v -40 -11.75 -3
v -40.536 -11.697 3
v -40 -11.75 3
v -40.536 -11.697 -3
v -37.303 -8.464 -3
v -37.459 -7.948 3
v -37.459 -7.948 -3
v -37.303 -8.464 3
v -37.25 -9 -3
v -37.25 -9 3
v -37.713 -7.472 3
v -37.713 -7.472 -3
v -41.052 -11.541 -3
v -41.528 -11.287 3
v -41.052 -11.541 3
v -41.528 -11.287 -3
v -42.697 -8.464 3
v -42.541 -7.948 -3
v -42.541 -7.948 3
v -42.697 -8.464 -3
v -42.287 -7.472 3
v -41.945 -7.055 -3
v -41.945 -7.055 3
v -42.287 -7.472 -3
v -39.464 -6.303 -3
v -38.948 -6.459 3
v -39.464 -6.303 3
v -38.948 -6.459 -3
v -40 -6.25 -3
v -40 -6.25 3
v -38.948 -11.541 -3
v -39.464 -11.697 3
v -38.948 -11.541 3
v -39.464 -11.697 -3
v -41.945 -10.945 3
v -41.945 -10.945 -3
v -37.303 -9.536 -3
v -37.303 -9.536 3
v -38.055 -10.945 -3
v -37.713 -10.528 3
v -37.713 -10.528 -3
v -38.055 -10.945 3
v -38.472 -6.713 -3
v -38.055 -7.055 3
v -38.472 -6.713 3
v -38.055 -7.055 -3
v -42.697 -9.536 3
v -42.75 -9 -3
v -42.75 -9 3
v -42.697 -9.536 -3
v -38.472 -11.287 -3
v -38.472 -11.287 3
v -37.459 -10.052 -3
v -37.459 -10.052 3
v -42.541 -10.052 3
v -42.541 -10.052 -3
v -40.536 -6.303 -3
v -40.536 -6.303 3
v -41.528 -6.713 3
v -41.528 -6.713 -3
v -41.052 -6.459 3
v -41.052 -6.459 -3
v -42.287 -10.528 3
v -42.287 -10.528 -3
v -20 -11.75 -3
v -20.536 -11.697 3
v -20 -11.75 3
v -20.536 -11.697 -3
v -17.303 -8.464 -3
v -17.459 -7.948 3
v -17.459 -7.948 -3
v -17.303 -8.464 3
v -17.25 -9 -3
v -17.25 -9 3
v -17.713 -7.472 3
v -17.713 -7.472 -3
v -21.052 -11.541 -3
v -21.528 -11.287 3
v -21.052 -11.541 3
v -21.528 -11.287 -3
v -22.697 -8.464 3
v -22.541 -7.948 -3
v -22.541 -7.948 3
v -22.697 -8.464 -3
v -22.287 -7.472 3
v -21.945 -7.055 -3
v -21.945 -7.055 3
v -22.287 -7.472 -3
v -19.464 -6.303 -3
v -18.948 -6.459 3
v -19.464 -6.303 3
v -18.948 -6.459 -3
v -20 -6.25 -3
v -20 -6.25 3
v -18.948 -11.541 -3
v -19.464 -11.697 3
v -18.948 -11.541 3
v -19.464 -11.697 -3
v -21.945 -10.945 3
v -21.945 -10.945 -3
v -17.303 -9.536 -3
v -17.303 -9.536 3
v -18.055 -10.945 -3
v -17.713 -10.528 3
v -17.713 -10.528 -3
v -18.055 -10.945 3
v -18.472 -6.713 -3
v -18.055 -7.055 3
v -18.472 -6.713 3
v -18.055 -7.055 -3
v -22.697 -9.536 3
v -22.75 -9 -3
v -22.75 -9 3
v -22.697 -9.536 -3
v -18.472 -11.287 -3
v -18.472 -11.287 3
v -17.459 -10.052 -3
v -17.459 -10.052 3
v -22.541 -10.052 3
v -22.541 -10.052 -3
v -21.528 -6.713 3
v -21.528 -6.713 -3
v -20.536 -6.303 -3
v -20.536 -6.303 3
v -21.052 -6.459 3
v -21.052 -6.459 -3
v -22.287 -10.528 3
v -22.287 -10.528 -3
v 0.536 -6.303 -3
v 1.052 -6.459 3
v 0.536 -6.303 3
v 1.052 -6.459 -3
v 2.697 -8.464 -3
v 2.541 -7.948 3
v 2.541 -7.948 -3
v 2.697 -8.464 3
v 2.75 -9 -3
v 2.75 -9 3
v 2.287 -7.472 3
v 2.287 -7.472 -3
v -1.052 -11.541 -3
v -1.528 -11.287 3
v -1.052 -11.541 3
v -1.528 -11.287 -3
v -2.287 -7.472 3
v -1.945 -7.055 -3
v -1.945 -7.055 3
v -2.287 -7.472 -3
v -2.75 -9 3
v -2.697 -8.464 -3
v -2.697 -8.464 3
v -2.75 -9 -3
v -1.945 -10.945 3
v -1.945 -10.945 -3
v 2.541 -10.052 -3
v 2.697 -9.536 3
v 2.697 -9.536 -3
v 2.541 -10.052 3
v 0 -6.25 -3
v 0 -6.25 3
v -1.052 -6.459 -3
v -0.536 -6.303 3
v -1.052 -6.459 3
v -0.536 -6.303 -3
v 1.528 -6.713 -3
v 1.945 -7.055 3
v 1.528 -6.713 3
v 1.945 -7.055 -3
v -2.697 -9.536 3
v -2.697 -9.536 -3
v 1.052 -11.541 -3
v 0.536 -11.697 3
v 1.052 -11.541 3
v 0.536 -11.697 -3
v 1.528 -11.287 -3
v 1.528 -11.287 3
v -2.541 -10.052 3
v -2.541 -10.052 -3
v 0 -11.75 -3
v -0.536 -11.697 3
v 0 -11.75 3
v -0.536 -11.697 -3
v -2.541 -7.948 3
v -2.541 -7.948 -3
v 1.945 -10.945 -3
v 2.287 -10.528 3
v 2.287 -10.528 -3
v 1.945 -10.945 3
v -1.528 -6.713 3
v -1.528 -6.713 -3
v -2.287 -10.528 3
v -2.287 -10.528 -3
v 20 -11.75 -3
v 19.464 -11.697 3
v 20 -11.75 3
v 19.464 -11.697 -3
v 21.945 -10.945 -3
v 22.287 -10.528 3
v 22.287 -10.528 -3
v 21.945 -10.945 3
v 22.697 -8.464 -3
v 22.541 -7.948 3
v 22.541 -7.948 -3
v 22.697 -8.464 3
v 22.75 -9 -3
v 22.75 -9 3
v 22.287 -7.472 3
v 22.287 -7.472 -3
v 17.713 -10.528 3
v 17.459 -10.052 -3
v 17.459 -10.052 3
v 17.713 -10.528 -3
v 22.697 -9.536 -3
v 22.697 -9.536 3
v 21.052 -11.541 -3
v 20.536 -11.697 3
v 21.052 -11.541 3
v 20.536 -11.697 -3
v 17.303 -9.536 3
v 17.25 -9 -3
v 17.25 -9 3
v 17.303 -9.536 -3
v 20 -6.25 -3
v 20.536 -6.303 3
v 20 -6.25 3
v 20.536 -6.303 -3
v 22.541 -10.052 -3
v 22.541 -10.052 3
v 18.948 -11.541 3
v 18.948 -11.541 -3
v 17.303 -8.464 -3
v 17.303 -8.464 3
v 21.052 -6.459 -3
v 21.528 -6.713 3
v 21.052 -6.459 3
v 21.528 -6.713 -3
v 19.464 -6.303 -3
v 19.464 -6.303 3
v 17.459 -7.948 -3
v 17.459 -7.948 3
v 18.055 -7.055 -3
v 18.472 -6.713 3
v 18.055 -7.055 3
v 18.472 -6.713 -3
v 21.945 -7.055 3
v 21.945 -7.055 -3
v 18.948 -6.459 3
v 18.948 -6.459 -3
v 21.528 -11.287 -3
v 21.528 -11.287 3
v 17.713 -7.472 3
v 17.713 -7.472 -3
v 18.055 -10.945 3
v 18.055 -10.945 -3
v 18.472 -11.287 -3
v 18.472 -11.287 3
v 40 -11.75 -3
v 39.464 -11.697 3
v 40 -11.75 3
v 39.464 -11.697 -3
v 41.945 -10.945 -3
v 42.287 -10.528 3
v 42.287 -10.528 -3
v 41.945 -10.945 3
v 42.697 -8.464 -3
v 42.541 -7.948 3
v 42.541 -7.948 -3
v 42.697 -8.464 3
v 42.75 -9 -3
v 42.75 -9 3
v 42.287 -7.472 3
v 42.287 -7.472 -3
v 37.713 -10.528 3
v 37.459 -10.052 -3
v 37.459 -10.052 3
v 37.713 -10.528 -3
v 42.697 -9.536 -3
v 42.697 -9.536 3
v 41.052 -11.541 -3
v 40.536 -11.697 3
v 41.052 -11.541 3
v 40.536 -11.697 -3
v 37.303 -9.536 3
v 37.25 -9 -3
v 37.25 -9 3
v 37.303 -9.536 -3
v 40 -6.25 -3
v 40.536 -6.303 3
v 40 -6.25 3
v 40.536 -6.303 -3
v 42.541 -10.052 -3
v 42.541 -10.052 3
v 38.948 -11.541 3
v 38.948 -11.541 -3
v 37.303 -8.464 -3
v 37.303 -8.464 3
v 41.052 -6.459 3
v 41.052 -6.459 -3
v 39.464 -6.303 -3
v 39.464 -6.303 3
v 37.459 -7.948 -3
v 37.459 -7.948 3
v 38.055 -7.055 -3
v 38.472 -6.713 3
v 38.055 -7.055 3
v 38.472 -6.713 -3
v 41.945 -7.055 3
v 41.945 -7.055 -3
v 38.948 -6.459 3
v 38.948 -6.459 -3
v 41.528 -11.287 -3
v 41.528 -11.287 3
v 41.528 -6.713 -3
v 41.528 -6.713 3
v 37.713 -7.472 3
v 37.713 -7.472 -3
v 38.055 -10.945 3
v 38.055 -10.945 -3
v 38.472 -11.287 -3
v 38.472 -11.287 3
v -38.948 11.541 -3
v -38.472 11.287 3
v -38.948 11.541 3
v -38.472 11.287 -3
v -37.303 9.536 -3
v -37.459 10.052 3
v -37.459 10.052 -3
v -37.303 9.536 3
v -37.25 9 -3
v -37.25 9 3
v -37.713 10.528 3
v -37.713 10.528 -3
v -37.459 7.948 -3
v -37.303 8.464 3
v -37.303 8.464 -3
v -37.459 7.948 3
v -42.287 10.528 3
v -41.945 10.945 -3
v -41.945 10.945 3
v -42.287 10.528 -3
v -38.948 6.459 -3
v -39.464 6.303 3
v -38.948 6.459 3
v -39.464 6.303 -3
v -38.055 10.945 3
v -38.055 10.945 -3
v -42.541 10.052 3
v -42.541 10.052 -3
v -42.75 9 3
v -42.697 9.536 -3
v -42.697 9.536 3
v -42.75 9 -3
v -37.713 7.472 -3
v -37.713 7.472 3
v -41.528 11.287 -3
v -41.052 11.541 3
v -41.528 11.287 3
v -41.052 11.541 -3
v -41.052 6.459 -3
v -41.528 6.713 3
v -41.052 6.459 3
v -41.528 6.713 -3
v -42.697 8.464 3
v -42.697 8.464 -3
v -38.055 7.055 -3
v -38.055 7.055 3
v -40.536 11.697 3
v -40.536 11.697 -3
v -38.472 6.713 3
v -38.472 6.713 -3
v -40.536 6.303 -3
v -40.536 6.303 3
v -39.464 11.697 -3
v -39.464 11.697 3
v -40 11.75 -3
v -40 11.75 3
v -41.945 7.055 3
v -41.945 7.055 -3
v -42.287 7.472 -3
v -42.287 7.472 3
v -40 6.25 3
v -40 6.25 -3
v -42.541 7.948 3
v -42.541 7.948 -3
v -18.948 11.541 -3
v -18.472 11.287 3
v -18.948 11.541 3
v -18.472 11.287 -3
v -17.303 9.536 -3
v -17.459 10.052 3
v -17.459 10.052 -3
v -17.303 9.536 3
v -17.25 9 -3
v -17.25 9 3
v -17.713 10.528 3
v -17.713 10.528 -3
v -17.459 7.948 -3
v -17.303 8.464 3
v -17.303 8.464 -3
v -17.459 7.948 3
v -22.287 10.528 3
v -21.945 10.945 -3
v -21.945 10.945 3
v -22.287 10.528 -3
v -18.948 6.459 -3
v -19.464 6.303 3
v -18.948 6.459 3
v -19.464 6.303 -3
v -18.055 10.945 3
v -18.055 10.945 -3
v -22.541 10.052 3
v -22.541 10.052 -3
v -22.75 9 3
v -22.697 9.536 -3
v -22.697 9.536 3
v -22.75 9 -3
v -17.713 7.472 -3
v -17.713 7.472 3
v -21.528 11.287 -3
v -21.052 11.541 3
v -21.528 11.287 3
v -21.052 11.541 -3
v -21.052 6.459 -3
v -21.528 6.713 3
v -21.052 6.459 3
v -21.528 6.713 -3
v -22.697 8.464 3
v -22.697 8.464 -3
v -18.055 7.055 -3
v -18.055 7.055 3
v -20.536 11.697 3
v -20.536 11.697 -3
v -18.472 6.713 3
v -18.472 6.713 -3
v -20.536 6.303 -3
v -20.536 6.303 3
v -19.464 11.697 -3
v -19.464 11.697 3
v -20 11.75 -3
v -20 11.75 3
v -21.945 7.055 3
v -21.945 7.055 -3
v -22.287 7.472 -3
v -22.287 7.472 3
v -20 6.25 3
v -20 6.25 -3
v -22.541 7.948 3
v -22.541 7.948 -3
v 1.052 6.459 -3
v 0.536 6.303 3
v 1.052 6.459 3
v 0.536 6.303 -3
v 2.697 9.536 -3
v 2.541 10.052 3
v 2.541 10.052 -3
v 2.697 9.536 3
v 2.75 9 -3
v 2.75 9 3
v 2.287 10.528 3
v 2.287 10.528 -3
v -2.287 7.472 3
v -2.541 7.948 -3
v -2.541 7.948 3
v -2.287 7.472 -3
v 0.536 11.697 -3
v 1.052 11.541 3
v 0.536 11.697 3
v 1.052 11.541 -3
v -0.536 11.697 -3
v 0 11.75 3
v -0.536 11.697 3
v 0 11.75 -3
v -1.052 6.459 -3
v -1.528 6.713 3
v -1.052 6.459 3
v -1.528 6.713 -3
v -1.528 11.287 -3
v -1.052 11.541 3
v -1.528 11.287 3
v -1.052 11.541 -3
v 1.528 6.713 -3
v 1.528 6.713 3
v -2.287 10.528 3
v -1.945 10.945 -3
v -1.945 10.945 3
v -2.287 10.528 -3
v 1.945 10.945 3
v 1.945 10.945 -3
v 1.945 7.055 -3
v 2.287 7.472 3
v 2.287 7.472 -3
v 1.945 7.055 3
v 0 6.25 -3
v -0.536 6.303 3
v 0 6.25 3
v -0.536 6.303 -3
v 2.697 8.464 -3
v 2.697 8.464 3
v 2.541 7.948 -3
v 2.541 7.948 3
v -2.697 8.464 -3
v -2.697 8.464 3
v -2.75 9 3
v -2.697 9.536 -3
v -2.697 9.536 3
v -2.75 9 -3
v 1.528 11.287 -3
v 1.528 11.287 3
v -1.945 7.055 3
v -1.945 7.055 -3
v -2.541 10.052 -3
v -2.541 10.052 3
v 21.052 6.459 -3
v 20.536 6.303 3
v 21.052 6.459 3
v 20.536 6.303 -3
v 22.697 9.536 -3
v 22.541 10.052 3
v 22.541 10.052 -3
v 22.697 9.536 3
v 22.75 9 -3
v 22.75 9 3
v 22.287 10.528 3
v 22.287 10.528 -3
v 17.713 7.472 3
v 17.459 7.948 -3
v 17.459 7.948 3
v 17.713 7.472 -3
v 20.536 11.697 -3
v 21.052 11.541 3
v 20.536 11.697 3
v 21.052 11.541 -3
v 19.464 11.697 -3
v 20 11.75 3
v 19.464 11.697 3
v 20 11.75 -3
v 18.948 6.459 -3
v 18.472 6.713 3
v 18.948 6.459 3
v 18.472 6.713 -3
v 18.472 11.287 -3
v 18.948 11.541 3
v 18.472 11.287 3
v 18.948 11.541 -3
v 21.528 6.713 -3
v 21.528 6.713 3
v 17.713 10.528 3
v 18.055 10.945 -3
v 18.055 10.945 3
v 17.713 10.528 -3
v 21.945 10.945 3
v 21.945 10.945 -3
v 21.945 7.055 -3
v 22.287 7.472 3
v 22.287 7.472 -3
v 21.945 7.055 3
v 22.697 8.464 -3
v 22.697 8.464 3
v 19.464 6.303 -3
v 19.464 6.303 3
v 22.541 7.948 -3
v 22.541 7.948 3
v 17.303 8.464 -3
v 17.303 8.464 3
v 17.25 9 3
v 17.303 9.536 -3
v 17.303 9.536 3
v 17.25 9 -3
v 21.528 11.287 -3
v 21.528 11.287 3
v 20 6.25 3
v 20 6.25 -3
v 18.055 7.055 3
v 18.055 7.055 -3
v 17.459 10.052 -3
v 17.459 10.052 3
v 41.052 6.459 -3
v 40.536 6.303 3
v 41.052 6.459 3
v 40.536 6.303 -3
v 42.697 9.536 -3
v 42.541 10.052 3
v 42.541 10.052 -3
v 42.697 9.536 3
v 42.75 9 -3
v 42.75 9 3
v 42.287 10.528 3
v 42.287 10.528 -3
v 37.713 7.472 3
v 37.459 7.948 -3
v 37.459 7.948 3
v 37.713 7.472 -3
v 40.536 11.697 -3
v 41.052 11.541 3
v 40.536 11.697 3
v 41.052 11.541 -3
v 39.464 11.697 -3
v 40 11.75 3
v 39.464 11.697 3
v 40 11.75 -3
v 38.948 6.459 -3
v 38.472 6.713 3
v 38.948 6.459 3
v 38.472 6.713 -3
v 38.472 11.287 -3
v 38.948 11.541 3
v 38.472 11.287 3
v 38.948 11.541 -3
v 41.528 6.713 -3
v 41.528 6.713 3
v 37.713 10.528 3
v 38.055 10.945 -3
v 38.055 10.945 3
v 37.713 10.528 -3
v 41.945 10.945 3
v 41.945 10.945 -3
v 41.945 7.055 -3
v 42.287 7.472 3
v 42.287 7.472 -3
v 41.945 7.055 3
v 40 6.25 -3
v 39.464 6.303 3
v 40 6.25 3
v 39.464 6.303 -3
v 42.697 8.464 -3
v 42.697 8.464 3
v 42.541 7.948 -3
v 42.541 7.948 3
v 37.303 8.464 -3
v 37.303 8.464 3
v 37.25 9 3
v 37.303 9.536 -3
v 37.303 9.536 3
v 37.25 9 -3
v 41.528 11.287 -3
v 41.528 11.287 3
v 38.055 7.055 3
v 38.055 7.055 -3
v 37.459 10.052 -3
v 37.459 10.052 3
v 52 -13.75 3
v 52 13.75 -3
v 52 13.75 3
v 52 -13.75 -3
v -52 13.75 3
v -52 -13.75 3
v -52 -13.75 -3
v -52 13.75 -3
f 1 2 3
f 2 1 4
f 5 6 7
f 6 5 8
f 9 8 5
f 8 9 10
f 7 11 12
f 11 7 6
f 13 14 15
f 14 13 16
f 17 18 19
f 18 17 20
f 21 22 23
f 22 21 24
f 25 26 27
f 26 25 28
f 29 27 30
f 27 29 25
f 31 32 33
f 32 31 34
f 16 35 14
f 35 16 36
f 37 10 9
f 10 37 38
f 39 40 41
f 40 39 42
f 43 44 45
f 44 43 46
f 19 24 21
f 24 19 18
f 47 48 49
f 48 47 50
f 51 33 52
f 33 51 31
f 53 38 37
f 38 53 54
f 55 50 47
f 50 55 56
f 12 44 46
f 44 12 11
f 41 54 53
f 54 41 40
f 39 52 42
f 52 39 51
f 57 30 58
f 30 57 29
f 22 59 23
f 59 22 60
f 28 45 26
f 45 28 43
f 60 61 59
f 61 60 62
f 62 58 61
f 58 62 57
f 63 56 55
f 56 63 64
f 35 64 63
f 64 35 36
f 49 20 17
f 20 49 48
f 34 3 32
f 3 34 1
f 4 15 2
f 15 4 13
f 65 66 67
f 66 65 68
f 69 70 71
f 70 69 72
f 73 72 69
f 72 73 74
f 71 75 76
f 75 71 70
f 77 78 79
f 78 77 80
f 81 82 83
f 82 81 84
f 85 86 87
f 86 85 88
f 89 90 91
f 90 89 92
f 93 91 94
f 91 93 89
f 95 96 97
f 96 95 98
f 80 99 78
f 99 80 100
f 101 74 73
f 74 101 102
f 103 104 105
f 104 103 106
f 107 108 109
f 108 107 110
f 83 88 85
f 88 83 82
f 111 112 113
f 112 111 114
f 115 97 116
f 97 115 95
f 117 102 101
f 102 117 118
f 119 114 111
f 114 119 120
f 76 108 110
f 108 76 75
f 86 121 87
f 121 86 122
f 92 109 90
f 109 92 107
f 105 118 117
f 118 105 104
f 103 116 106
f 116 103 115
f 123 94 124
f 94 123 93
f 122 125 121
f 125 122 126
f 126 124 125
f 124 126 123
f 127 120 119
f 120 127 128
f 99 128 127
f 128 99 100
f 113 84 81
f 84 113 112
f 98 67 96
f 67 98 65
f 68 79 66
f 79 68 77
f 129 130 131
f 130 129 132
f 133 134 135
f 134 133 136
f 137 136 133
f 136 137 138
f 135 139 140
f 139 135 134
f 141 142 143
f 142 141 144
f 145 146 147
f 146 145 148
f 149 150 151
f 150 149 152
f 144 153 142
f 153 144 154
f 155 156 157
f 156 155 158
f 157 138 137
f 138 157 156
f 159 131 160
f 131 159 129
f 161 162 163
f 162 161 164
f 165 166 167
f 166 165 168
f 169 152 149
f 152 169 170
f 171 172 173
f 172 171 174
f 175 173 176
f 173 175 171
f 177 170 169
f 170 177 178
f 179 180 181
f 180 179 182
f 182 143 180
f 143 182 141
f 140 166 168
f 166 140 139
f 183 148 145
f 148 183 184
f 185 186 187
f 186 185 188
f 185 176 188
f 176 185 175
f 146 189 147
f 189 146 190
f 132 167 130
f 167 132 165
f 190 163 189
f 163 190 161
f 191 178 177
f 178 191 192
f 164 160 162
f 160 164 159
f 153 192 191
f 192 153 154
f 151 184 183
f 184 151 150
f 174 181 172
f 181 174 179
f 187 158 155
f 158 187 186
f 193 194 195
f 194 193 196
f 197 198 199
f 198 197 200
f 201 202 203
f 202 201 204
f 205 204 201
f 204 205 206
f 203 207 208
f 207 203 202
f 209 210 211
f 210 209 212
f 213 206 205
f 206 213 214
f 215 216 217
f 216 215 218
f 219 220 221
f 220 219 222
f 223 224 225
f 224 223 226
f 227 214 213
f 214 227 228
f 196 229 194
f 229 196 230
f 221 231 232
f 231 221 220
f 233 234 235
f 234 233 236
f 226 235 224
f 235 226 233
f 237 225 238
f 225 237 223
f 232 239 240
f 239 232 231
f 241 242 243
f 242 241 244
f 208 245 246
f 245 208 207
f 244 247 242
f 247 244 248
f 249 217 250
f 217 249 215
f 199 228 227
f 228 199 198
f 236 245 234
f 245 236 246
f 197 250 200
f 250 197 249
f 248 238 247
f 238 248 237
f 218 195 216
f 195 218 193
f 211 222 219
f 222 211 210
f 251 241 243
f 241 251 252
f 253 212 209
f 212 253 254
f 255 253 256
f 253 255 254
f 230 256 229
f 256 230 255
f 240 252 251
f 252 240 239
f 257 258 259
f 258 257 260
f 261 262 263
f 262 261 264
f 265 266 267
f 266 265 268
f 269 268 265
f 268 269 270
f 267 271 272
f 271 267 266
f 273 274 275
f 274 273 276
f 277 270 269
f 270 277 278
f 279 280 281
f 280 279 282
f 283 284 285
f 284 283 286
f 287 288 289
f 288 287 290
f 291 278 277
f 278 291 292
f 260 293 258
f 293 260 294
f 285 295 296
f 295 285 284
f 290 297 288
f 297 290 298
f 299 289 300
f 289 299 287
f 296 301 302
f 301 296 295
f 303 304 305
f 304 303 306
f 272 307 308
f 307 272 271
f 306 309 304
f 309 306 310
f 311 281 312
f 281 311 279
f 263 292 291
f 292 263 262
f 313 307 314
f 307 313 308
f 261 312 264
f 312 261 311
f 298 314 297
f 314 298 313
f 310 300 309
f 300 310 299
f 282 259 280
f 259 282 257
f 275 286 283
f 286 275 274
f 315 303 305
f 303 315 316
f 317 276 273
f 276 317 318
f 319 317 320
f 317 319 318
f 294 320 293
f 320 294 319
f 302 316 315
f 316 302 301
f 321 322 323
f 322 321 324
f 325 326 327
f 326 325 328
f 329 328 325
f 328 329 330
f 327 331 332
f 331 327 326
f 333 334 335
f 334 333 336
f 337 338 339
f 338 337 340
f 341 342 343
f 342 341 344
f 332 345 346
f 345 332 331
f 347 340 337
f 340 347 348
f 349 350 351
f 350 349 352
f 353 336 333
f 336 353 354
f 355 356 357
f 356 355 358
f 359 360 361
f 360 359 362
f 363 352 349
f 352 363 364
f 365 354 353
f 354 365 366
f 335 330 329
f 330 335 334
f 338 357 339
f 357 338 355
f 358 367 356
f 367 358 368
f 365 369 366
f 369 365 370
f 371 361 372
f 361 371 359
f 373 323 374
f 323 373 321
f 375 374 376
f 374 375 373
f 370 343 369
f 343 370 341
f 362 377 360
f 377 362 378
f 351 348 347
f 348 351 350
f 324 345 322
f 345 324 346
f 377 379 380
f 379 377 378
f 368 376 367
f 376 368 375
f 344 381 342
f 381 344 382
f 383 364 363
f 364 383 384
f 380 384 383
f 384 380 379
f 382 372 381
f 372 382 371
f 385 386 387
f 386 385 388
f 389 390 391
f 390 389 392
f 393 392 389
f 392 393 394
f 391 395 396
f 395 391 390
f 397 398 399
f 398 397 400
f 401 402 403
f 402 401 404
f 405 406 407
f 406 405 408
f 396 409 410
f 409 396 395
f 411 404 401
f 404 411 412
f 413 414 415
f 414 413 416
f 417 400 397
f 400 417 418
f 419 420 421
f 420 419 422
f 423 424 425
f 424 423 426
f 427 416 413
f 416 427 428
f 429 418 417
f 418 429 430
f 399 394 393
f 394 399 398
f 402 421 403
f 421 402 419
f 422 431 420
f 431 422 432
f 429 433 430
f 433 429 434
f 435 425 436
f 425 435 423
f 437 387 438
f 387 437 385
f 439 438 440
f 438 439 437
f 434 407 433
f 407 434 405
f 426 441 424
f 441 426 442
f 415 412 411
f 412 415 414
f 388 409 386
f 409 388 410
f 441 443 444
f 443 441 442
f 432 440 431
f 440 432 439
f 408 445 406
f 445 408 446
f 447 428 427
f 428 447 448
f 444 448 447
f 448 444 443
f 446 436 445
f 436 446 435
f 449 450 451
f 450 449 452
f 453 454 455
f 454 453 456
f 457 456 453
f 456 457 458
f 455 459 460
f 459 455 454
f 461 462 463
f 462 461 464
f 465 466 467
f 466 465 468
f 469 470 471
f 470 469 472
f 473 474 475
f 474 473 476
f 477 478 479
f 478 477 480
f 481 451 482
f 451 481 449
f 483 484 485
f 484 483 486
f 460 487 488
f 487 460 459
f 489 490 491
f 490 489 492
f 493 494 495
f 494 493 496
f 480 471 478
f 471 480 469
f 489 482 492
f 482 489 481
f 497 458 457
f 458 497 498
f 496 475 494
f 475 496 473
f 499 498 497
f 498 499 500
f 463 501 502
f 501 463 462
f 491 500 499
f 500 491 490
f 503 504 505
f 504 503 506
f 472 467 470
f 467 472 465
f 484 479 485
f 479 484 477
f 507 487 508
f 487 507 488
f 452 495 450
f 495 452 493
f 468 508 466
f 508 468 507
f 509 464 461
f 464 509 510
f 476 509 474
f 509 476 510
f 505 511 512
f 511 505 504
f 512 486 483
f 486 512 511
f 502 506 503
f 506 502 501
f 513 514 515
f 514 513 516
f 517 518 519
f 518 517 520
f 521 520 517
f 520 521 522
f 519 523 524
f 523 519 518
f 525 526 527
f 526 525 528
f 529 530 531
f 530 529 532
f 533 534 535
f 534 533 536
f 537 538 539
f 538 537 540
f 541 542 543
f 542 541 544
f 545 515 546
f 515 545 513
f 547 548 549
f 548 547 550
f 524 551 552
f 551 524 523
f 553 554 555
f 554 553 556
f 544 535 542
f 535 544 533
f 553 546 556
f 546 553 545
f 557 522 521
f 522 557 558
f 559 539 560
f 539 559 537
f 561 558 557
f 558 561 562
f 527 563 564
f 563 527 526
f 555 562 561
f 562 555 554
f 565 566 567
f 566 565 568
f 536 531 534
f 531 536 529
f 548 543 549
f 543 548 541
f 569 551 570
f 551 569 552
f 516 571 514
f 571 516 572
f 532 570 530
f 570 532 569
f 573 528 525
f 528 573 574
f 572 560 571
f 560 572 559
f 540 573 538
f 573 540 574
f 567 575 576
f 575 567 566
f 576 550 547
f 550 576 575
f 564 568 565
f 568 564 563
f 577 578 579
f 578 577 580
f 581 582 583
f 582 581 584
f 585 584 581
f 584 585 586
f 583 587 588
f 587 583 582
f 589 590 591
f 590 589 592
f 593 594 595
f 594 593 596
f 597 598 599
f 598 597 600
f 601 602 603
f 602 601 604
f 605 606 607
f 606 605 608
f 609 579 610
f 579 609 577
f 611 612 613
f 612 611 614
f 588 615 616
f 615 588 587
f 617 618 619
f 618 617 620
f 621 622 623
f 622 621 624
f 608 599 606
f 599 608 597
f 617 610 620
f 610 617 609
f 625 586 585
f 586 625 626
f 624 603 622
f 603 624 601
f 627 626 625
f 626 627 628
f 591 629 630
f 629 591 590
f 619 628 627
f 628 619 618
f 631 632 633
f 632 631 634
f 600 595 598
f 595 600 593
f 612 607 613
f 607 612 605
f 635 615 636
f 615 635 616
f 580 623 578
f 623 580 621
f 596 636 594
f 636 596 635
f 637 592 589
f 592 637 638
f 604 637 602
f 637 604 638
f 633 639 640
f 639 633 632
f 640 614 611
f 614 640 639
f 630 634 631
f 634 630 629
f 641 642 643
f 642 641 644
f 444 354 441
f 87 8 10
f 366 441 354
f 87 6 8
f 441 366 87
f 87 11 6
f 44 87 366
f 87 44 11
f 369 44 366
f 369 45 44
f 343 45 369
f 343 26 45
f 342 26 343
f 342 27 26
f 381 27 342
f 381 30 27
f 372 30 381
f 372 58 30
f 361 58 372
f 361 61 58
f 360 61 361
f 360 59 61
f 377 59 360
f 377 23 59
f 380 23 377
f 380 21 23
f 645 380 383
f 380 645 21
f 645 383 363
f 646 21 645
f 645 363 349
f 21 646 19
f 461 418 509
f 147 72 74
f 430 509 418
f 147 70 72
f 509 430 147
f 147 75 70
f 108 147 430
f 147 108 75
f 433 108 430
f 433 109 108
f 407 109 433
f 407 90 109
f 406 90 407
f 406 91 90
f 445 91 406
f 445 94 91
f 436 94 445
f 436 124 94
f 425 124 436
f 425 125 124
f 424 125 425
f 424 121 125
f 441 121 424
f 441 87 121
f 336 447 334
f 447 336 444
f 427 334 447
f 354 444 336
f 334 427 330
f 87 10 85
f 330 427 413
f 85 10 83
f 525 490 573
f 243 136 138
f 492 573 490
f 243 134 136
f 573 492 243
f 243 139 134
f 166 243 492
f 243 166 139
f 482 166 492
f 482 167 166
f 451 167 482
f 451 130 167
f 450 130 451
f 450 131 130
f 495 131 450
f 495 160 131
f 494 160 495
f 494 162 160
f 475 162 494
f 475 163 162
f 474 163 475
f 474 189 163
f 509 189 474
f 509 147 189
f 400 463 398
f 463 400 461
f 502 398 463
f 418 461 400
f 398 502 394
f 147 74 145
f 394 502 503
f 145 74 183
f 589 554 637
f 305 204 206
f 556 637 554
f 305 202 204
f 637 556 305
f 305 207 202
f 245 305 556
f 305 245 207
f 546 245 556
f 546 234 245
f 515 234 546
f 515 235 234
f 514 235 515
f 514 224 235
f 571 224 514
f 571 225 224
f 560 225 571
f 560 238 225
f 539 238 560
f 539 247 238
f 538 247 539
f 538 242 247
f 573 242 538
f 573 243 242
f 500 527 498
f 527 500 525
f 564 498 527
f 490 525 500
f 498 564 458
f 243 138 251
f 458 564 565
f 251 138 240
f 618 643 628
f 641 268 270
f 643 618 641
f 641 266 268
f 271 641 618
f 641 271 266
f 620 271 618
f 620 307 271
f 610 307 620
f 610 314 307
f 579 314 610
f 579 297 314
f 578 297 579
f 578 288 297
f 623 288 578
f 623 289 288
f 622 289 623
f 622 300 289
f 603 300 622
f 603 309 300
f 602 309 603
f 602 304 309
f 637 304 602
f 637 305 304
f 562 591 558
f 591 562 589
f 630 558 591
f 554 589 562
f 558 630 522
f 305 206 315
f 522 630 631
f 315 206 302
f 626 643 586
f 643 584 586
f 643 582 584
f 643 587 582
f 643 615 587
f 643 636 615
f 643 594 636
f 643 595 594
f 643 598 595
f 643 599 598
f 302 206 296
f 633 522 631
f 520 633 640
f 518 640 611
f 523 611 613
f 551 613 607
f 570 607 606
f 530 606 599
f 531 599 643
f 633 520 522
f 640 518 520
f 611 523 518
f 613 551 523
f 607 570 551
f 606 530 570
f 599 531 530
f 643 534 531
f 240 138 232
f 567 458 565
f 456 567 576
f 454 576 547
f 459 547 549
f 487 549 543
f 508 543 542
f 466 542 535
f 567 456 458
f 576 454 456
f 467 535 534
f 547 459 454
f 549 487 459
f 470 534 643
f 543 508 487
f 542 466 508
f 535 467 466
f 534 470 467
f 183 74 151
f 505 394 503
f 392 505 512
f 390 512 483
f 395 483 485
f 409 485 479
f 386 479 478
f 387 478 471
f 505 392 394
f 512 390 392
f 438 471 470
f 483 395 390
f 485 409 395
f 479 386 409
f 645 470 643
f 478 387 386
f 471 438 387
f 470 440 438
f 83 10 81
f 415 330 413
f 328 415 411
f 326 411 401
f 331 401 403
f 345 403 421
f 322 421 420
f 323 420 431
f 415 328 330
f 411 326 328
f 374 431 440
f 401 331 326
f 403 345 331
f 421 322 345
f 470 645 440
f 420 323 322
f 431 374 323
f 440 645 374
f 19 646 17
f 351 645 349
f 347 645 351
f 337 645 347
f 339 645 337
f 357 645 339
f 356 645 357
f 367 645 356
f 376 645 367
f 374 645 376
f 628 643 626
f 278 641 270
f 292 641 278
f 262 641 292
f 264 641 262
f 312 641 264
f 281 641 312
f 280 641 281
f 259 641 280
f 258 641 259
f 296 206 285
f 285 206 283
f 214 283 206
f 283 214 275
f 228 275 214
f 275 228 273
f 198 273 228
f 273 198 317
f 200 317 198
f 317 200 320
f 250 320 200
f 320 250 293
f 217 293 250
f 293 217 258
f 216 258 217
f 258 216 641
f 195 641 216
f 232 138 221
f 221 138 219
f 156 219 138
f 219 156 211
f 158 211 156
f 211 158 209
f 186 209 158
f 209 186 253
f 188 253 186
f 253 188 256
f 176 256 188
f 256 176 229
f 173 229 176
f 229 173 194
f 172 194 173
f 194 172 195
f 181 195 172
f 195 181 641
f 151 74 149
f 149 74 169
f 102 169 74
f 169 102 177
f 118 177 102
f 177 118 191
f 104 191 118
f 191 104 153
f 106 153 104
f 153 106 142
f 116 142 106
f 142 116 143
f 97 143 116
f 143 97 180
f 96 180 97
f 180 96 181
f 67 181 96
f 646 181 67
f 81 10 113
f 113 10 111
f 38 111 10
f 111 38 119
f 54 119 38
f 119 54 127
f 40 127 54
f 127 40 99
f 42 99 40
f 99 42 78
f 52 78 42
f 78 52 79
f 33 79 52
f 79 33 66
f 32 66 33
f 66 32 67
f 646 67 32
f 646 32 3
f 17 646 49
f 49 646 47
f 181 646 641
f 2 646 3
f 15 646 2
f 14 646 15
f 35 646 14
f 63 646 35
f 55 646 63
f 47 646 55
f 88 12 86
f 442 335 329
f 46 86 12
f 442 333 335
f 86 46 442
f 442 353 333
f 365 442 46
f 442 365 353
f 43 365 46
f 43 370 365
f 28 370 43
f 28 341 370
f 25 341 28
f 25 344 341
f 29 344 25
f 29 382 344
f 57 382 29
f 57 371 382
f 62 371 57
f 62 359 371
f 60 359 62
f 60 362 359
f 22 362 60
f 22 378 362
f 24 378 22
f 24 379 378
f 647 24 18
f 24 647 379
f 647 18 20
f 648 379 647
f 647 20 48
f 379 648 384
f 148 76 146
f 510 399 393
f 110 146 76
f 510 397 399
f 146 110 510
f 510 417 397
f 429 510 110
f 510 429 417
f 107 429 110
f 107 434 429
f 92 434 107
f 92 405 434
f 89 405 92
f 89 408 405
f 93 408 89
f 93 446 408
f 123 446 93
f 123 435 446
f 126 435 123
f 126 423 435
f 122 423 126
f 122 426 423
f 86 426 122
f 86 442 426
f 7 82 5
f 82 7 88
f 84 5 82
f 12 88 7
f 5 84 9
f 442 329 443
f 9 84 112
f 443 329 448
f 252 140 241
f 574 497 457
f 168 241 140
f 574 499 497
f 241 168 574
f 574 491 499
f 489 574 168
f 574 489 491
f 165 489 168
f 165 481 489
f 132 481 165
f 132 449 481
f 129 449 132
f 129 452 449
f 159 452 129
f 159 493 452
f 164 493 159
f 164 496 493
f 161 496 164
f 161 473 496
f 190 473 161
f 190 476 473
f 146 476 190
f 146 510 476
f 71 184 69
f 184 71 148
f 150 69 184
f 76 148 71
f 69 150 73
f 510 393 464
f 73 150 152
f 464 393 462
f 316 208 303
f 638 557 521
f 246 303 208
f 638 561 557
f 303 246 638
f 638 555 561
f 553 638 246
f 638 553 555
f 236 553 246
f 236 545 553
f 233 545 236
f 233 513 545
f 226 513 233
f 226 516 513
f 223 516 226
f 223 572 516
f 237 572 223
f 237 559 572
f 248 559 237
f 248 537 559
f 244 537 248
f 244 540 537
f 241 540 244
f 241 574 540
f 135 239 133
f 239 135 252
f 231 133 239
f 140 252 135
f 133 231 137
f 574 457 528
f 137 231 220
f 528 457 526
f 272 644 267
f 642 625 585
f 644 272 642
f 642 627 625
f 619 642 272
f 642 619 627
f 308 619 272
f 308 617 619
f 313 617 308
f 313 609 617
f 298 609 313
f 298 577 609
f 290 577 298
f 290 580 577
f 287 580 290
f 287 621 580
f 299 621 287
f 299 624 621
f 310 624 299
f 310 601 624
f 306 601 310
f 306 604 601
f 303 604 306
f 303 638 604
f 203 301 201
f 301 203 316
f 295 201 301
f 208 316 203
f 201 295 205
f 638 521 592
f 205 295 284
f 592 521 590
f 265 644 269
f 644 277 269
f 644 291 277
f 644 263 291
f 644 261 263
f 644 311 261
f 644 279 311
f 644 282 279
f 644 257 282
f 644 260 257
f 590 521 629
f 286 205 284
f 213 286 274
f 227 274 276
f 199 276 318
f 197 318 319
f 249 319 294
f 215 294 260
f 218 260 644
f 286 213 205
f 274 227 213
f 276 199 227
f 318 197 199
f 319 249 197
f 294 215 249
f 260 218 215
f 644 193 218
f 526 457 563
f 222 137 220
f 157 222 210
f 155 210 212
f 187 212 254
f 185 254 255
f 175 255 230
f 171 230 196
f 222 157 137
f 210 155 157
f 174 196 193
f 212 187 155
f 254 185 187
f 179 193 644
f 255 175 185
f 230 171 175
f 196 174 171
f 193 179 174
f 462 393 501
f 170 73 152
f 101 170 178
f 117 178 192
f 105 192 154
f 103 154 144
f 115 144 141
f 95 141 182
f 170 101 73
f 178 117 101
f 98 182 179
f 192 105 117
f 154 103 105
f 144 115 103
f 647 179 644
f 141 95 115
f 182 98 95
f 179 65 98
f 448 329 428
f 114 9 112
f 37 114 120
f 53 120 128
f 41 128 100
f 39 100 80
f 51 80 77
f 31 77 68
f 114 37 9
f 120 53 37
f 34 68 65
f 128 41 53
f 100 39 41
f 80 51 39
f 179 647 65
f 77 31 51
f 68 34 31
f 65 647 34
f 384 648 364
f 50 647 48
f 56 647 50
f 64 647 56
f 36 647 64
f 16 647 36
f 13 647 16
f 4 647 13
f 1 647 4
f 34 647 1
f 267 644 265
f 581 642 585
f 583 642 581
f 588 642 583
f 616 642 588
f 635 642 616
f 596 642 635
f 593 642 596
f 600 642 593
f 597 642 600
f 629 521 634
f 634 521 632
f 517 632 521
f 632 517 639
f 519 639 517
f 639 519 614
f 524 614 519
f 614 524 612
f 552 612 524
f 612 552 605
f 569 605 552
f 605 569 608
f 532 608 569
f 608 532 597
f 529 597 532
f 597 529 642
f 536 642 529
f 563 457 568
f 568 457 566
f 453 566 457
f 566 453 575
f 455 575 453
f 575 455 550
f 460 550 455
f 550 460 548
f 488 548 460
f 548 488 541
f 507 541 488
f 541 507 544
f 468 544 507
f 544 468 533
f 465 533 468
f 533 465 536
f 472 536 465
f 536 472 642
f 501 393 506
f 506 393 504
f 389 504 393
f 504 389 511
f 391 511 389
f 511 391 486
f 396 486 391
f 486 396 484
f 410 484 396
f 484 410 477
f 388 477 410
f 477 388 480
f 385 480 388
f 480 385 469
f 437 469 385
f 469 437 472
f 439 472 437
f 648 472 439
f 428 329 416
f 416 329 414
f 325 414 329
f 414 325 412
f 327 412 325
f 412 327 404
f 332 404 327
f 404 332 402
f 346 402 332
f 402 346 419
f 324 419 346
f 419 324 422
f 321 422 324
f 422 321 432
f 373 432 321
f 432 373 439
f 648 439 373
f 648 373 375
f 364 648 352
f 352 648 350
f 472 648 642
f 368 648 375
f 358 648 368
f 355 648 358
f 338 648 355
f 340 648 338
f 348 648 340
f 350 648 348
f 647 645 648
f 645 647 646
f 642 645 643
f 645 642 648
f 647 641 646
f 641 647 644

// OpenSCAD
$fn = 32;

// ----------------------------------------------------------------------
// Hole bar, 5 x Ø5.5
// tworows layout, 12 mm edge offset
// ----------------------------------------------------------------------

// --- parameters (mm) ---
bar_w = 27.5;     // bar width (Y)
bar_t = 6;        // bar thickness (Z)
holes = 5;        // holes per row
hole_d = 5.5;     // hole diameter
edge = 12;        // offset from the bar end to the first hole
pitch = 20;       // pitch between neighbouring holes
row_offset = 18;  // distance between the two rows

// --- derived feature positions (mm) ---
span = (holes - 1) * pitch;   // = 80   distance between the end holes
bar_l = span + 2 * edge;      // = 104   overall bar length
start_x = -bar_l / 2 + edge;  // = -40   X of the first hole
feature_centers = [
  [start_x + 0 * pitch, -row_offset / 2],
  [start_x + 1 * pitch, -row_offset / 2],
  [start_x + 2 * pitch, -row_offset / 2],
  [start_x + 3 * pitch, -row_offset / 2],
  [start_x + 4 * pitch, -row_offset / 2]
];   // hole centres of the first row
row2_centers = [
  [start_x + 0 * pitch, row_offset / 2],
  [start_x + 1 * pitch, row_offset / 2],
  [start_x + 2 * pitch, row_offset / 2],
  [start_x + 3 * pitch, row_offset / 2],
  [start_x + 4 * pitch, row_offset / 2]
];   // hole centres of the second row

// bar with two rows of holes, both read from their own centre arrays
difference() {
  translate([-bar_l / 2, -bar_w / 2, -bar_t / 2]) cube([bar_l, bar_w, bar_t]);
  for (centre = feature_centers)
    translate([centre[0], centre[1], 0])
      cylinder(d = hole_d, h = bar_t + 2, center = true);
  for (centre = row2_centers)
    translate([centre[0], centre[1], 0])
      cylinder(d = hole_d, h = bar_t + 2, center = true);
}
